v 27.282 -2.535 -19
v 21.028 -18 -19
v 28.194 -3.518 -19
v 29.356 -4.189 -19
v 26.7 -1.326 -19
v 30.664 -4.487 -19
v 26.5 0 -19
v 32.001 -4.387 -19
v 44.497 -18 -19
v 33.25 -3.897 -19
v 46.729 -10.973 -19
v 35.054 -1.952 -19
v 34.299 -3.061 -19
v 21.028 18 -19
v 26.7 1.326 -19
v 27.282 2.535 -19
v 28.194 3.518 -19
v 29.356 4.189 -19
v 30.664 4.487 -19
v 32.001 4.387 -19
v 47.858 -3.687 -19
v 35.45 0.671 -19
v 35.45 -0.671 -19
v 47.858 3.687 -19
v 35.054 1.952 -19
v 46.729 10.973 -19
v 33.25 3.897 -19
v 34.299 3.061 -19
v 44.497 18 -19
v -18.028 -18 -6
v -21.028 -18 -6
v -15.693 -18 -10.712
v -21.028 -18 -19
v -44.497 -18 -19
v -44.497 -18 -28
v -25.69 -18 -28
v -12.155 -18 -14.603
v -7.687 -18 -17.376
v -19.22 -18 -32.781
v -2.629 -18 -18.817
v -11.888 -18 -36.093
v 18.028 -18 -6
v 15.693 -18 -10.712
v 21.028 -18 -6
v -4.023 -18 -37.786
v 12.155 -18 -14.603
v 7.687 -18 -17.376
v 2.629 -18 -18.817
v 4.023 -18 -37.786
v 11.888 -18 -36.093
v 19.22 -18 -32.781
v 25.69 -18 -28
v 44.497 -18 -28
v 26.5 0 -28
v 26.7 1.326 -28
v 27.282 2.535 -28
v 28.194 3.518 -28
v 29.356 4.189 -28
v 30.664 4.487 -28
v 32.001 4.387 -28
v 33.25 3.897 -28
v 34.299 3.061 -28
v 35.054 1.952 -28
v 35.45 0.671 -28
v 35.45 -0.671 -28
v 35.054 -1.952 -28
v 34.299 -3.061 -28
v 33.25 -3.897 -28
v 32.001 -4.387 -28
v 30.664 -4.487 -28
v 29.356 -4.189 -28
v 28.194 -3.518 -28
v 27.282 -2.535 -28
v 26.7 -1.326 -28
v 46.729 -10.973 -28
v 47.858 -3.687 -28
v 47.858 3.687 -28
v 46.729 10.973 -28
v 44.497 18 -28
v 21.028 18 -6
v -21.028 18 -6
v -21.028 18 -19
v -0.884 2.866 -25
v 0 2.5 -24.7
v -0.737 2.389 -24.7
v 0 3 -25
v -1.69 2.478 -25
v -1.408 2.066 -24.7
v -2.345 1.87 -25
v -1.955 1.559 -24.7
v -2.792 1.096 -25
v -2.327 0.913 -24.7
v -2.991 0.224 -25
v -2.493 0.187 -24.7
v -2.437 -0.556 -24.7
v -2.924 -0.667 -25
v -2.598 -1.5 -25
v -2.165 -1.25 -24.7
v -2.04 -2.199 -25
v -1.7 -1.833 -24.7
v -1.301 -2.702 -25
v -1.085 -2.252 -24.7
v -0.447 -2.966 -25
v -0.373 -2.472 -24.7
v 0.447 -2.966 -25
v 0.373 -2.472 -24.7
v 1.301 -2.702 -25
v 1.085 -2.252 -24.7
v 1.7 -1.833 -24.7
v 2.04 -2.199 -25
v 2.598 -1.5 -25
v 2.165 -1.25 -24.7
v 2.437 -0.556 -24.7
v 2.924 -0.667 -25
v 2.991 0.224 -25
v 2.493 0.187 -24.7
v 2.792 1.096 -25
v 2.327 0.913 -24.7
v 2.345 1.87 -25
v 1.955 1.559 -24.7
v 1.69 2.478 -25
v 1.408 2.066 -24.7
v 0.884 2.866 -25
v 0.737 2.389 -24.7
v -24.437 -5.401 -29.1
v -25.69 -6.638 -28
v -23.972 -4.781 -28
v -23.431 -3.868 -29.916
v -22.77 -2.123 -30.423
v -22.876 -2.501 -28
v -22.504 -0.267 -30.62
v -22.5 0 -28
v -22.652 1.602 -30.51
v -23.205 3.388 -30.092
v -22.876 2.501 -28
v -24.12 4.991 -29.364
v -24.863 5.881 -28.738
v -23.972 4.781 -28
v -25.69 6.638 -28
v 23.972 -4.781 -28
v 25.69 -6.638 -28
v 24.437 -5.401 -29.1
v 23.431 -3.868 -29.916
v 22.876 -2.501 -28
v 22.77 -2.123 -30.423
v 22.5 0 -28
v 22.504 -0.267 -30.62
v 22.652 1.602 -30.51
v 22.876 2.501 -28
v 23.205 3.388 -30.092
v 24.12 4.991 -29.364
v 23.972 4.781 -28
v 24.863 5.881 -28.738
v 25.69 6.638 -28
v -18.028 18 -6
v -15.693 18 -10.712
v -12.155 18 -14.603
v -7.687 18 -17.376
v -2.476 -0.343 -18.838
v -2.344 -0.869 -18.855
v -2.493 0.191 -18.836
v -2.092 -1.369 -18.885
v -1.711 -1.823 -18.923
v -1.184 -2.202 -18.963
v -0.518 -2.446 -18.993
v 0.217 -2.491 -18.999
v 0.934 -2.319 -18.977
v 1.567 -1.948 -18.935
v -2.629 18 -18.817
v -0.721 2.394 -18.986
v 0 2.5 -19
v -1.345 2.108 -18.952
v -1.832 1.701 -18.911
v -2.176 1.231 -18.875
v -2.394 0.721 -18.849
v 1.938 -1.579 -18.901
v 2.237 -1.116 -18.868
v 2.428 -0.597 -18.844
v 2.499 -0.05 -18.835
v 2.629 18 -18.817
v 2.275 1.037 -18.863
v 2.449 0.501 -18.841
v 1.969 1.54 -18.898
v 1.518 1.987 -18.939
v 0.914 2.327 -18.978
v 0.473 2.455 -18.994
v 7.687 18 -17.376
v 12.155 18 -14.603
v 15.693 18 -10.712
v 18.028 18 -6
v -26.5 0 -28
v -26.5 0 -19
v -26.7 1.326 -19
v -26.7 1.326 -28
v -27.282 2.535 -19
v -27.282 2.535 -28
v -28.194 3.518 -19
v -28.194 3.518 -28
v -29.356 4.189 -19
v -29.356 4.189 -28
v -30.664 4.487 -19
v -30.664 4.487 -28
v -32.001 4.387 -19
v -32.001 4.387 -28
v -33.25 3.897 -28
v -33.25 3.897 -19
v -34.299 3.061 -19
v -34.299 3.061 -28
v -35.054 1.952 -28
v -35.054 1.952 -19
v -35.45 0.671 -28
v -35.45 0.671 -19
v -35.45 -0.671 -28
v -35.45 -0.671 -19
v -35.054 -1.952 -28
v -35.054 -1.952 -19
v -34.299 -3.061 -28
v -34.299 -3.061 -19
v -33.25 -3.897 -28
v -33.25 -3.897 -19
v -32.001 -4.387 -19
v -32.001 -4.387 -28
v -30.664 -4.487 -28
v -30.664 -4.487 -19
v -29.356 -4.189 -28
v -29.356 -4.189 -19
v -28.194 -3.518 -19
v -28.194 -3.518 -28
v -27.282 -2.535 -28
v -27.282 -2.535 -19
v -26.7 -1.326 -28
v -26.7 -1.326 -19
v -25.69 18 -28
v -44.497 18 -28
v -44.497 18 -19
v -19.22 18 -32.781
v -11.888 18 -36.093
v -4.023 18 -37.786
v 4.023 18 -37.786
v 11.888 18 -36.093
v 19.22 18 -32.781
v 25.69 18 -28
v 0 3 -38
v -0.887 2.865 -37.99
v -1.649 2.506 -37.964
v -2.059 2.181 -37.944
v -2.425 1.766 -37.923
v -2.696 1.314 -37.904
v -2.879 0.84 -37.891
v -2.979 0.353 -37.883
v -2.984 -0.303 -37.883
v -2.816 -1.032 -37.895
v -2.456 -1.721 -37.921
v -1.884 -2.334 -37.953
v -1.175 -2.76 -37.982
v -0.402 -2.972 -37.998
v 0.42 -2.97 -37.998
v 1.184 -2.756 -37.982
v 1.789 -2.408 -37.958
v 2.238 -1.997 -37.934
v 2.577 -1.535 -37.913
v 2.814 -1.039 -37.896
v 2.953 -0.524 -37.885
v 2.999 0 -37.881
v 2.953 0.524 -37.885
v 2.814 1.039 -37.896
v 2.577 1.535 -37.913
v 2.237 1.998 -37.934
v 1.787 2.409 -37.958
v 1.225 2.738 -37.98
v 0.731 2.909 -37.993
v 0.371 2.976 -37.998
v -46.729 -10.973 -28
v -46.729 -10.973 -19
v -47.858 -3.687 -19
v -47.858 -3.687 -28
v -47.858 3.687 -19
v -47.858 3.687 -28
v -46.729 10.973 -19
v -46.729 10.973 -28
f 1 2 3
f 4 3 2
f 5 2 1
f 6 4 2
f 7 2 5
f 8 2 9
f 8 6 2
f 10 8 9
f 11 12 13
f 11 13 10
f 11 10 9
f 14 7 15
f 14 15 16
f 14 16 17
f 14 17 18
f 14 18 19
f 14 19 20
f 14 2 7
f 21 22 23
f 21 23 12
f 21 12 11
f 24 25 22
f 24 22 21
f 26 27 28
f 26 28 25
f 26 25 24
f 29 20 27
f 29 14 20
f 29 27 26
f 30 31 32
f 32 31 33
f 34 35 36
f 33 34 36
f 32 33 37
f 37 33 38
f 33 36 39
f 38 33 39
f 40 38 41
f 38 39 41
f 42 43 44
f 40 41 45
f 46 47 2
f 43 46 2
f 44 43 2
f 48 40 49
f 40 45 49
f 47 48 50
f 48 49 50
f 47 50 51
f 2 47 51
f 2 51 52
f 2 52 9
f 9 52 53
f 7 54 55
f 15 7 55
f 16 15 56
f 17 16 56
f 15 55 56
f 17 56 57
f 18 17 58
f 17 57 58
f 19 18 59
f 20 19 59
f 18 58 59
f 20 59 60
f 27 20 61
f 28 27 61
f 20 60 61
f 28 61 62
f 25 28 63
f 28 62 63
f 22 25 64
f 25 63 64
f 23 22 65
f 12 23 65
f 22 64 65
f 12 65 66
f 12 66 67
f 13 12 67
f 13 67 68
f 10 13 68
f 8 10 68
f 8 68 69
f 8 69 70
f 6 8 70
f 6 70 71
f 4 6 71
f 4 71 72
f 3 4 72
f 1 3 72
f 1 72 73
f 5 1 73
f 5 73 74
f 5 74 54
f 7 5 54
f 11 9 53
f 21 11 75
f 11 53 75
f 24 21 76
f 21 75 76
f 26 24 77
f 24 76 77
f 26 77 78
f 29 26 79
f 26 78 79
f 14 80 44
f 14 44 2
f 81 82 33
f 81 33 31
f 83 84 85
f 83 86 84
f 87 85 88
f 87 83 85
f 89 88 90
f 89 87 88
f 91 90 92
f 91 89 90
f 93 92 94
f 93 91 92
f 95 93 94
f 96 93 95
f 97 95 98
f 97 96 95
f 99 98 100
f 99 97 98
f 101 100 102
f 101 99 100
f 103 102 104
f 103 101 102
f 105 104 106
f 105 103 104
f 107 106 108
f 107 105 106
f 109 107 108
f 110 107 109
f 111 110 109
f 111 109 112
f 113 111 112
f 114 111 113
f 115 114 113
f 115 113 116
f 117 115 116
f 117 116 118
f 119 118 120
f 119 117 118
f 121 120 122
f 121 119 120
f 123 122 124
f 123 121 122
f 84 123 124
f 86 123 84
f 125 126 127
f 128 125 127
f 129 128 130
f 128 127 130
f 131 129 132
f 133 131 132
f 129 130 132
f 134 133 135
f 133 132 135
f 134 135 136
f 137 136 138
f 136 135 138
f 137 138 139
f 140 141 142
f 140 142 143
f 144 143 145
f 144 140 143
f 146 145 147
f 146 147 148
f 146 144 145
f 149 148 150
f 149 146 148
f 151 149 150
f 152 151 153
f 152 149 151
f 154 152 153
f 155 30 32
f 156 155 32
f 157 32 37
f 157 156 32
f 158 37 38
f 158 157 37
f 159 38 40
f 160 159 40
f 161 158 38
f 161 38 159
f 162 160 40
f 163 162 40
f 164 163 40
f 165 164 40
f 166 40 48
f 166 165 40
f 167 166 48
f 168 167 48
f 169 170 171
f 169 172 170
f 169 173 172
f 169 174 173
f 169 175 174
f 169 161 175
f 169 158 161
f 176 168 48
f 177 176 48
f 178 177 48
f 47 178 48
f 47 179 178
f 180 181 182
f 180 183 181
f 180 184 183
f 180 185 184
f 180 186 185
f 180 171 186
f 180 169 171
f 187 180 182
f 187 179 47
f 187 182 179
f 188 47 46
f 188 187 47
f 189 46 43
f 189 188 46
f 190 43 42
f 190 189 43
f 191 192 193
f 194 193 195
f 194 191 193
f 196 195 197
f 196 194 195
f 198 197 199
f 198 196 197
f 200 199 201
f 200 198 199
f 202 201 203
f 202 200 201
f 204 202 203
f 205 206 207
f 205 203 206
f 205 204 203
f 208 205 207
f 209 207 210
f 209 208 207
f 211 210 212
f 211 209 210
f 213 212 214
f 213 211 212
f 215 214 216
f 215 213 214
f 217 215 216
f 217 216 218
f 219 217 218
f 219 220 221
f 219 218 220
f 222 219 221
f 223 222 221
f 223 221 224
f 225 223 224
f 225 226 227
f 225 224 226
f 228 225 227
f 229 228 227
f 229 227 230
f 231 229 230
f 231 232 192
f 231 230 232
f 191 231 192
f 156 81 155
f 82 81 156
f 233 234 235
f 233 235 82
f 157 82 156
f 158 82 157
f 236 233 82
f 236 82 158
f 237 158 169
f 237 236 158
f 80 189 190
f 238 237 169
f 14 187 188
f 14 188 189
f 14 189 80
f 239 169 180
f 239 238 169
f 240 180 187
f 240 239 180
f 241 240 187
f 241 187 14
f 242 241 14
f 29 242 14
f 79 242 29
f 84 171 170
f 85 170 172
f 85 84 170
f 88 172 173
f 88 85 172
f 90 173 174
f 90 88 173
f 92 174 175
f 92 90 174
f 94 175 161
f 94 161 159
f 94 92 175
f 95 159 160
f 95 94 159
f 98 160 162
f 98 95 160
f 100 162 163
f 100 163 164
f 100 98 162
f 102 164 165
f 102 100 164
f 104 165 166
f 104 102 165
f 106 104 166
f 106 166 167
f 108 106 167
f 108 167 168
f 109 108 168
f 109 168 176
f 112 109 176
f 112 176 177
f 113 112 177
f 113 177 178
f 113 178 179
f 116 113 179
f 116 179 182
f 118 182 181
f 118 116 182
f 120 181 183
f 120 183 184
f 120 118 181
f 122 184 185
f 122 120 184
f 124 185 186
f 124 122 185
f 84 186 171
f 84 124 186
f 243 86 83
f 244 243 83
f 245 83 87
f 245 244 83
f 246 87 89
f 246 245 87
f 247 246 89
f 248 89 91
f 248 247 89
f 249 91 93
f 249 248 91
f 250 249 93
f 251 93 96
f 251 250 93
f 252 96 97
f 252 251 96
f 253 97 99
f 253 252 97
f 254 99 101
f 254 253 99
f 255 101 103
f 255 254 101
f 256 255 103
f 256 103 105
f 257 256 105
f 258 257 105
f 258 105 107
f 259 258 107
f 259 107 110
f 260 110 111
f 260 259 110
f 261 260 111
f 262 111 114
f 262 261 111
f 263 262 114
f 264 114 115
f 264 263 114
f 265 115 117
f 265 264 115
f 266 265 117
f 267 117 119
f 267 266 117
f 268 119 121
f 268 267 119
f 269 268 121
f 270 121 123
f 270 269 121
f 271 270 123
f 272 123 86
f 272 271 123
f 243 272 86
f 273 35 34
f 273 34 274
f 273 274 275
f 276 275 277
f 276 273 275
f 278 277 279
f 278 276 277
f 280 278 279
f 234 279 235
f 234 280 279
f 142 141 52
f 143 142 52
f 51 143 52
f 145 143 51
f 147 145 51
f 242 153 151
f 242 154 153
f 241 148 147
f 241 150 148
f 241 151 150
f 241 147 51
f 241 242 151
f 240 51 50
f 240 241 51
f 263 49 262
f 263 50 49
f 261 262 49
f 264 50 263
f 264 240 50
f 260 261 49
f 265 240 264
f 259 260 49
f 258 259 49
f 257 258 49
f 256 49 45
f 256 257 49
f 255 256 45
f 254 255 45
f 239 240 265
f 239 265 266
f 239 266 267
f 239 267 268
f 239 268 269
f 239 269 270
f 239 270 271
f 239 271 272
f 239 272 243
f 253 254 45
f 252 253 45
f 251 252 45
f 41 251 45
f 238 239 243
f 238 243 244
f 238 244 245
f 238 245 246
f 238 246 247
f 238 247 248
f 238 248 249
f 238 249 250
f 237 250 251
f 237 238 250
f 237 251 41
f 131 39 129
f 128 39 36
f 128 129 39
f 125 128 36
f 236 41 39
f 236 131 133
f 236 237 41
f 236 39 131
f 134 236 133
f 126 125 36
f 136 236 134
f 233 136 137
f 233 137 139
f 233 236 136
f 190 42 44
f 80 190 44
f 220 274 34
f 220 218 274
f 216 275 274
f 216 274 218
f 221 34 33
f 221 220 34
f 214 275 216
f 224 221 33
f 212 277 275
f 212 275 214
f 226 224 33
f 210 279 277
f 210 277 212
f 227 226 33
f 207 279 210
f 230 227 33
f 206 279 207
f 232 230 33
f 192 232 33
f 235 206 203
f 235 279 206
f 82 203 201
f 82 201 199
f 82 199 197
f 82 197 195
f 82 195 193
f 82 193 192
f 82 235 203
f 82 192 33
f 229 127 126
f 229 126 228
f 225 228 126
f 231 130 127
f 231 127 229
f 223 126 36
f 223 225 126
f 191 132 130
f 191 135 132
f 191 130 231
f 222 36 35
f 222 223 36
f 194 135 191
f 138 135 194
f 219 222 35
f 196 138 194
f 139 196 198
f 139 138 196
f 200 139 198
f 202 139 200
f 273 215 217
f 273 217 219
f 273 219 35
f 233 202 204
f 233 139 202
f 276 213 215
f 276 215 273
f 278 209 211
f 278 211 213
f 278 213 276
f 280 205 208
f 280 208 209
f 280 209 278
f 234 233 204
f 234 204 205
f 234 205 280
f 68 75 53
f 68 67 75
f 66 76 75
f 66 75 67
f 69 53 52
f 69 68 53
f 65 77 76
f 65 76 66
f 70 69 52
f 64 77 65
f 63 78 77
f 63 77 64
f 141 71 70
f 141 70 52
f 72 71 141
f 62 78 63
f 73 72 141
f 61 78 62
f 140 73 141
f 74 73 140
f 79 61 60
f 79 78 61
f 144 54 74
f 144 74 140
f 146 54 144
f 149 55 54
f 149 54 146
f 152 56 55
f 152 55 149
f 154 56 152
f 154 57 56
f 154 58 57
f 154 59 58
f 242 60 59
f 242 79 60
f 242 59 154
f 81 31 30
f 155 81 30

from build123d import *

# Parameters (mm, degrees)
BOSS_EXTRUDE1_DEPTH = 18
CUT_EXTRUDE1_DEPTH  = 36
SKETCH7_R           = 4.5
CUT_EXTRUDE3_DEPTH  = 36
CUT_EXTRUDE4_DEPTH  = 11


with BuildPart() as part:
    # Sketch2 → Boss-Extrude1 (new body, symmetric)
    with BuildSketch(Plane(origin=(0, 0, 0), x_dir=(1, 0, 0), z_dir=(0, 1, 0))):
        with BuildLine():
            Line((-25.690465157, 28), (-50, 28))
            Line((-50, 28), (-50, 19))
            Line((-50, 19), (-21.027756377, 19))
            Line((-21.027756377, 19), (-21.027756377, 6))
            Line((-21.027756377, 6), (-18.027756377, 6))
            ThreePointArc((-18.027756377, 6), (0, 19), (18.027756377, 6))
            Line((18.027756377, 6), (21.027756377, 6))
            Line((21.027756377, 6), (21.027756377, 19))
            Line((21.027756377, 19), (50, 19))
            Line((50, 19), (50, 28))
            Line((50, 28), (25.690465157, 28))
            ThreePointArc((25.690465157, 28), (0, 38), (-25.690465157, 28))
        make_face()
    extrude(amount=BOSS_EXTRUDE1_DEPTH, both=True)

    # Sketch4 → Cut-Extrude1 (cut)
    with BuildSketch(Plane(origin=(0, 0, -28), x_dir=(-1, 0, 0), z_dir=(0, 0, -1))):
        with BuildLine():
            Line((-50, -18), (-44.497190923, -18))
            ThreePointArc((-44.497190923, -18), (-48, 0), (-44.497190923, 18))
            Line((-44.497190923, 18), (-50, 18))
            Line((-50, 18), (-50, -18))
        make_face()
    cut_extrude1 = extrude(amount=-CUT_EXTRUDE1_DEPTH, mode=Mode.SUBTRACT)

    # Mirror1: Cut-Extrude1 across plane
    add(cut_extrude1.mirror(Plane(origin=(0, 0, 0), x_dir=(0, 0, 1), z_dir=(1, 0, 0))), mode=Mode.SUBTRACT)

    # Sketch7 → Cut-Extrude3 (cut)
    with BuildSketch(Plane(origin=(0, 0, -28), x_dir=(-1, 0, 0), z_dir=(0, 0, -1))):
        with Locations((-31, 0)):
            Circle(SKETCH7_R)
    cut_extrude3 = extrude(amount=-CUT_EXTRUDE3_DEPTH, mode=Mode.SUBTRACT)

    # Sketch8 → Cut-Extrude4 (cut, through all)
    with BuildSketch(Plane(origin=(0, 0, -28), x_dir=(-1, 0, 0), z_dir=(0, 0, -1))):
        with BuildLine():
            Line((-25.690465157, 6.637683312), (-25.690465157, -6.637683312))
            ThreePointArc((-25.690465157, -6.637683312), (-22.5, 0), (-25.690465157, 6.637683312))
        make_face()
    cut_extrude4 = extrude(amount=CUT_EXTRUDE4_DEPTH, mode=Mode.SUBTRACT)

    # Mirror3: Cut-Extrude3, Cut-Extrude4 across plane
    add(cut_extrude3.mirror(Plane(origin=(0, 0, 0), x_dir=(0, 0, 1), z_dir=(1, 0, 0))), mode=Mode.SUBTRACT)
    add(cut_extrude4.mirror(Plane(origin=(0, 0, 0), x_dir=(0, 0, 1), z_dir=(1, 0, 0))), mode=Mode.SUBTRACT)

    # Sketch11 → CBORE for M5 Hex Head Bolt1 (revolve, cut)
    with BuildSketch(Plane(origin=(0, 0, -38), x_dir=(0, 1, 0), z_dir=(1, 0, 0))):
        Polygon((0, 0), (0, 32), (2.5, 32), (2.5, 13.300129879), (2.9995, 13), (3, 0), align=None)
    revolve(axis=Axis((0, 0, -44.35), (0, 0, 1)), mode=Mode.SUBTRACT)


solid = part.part
